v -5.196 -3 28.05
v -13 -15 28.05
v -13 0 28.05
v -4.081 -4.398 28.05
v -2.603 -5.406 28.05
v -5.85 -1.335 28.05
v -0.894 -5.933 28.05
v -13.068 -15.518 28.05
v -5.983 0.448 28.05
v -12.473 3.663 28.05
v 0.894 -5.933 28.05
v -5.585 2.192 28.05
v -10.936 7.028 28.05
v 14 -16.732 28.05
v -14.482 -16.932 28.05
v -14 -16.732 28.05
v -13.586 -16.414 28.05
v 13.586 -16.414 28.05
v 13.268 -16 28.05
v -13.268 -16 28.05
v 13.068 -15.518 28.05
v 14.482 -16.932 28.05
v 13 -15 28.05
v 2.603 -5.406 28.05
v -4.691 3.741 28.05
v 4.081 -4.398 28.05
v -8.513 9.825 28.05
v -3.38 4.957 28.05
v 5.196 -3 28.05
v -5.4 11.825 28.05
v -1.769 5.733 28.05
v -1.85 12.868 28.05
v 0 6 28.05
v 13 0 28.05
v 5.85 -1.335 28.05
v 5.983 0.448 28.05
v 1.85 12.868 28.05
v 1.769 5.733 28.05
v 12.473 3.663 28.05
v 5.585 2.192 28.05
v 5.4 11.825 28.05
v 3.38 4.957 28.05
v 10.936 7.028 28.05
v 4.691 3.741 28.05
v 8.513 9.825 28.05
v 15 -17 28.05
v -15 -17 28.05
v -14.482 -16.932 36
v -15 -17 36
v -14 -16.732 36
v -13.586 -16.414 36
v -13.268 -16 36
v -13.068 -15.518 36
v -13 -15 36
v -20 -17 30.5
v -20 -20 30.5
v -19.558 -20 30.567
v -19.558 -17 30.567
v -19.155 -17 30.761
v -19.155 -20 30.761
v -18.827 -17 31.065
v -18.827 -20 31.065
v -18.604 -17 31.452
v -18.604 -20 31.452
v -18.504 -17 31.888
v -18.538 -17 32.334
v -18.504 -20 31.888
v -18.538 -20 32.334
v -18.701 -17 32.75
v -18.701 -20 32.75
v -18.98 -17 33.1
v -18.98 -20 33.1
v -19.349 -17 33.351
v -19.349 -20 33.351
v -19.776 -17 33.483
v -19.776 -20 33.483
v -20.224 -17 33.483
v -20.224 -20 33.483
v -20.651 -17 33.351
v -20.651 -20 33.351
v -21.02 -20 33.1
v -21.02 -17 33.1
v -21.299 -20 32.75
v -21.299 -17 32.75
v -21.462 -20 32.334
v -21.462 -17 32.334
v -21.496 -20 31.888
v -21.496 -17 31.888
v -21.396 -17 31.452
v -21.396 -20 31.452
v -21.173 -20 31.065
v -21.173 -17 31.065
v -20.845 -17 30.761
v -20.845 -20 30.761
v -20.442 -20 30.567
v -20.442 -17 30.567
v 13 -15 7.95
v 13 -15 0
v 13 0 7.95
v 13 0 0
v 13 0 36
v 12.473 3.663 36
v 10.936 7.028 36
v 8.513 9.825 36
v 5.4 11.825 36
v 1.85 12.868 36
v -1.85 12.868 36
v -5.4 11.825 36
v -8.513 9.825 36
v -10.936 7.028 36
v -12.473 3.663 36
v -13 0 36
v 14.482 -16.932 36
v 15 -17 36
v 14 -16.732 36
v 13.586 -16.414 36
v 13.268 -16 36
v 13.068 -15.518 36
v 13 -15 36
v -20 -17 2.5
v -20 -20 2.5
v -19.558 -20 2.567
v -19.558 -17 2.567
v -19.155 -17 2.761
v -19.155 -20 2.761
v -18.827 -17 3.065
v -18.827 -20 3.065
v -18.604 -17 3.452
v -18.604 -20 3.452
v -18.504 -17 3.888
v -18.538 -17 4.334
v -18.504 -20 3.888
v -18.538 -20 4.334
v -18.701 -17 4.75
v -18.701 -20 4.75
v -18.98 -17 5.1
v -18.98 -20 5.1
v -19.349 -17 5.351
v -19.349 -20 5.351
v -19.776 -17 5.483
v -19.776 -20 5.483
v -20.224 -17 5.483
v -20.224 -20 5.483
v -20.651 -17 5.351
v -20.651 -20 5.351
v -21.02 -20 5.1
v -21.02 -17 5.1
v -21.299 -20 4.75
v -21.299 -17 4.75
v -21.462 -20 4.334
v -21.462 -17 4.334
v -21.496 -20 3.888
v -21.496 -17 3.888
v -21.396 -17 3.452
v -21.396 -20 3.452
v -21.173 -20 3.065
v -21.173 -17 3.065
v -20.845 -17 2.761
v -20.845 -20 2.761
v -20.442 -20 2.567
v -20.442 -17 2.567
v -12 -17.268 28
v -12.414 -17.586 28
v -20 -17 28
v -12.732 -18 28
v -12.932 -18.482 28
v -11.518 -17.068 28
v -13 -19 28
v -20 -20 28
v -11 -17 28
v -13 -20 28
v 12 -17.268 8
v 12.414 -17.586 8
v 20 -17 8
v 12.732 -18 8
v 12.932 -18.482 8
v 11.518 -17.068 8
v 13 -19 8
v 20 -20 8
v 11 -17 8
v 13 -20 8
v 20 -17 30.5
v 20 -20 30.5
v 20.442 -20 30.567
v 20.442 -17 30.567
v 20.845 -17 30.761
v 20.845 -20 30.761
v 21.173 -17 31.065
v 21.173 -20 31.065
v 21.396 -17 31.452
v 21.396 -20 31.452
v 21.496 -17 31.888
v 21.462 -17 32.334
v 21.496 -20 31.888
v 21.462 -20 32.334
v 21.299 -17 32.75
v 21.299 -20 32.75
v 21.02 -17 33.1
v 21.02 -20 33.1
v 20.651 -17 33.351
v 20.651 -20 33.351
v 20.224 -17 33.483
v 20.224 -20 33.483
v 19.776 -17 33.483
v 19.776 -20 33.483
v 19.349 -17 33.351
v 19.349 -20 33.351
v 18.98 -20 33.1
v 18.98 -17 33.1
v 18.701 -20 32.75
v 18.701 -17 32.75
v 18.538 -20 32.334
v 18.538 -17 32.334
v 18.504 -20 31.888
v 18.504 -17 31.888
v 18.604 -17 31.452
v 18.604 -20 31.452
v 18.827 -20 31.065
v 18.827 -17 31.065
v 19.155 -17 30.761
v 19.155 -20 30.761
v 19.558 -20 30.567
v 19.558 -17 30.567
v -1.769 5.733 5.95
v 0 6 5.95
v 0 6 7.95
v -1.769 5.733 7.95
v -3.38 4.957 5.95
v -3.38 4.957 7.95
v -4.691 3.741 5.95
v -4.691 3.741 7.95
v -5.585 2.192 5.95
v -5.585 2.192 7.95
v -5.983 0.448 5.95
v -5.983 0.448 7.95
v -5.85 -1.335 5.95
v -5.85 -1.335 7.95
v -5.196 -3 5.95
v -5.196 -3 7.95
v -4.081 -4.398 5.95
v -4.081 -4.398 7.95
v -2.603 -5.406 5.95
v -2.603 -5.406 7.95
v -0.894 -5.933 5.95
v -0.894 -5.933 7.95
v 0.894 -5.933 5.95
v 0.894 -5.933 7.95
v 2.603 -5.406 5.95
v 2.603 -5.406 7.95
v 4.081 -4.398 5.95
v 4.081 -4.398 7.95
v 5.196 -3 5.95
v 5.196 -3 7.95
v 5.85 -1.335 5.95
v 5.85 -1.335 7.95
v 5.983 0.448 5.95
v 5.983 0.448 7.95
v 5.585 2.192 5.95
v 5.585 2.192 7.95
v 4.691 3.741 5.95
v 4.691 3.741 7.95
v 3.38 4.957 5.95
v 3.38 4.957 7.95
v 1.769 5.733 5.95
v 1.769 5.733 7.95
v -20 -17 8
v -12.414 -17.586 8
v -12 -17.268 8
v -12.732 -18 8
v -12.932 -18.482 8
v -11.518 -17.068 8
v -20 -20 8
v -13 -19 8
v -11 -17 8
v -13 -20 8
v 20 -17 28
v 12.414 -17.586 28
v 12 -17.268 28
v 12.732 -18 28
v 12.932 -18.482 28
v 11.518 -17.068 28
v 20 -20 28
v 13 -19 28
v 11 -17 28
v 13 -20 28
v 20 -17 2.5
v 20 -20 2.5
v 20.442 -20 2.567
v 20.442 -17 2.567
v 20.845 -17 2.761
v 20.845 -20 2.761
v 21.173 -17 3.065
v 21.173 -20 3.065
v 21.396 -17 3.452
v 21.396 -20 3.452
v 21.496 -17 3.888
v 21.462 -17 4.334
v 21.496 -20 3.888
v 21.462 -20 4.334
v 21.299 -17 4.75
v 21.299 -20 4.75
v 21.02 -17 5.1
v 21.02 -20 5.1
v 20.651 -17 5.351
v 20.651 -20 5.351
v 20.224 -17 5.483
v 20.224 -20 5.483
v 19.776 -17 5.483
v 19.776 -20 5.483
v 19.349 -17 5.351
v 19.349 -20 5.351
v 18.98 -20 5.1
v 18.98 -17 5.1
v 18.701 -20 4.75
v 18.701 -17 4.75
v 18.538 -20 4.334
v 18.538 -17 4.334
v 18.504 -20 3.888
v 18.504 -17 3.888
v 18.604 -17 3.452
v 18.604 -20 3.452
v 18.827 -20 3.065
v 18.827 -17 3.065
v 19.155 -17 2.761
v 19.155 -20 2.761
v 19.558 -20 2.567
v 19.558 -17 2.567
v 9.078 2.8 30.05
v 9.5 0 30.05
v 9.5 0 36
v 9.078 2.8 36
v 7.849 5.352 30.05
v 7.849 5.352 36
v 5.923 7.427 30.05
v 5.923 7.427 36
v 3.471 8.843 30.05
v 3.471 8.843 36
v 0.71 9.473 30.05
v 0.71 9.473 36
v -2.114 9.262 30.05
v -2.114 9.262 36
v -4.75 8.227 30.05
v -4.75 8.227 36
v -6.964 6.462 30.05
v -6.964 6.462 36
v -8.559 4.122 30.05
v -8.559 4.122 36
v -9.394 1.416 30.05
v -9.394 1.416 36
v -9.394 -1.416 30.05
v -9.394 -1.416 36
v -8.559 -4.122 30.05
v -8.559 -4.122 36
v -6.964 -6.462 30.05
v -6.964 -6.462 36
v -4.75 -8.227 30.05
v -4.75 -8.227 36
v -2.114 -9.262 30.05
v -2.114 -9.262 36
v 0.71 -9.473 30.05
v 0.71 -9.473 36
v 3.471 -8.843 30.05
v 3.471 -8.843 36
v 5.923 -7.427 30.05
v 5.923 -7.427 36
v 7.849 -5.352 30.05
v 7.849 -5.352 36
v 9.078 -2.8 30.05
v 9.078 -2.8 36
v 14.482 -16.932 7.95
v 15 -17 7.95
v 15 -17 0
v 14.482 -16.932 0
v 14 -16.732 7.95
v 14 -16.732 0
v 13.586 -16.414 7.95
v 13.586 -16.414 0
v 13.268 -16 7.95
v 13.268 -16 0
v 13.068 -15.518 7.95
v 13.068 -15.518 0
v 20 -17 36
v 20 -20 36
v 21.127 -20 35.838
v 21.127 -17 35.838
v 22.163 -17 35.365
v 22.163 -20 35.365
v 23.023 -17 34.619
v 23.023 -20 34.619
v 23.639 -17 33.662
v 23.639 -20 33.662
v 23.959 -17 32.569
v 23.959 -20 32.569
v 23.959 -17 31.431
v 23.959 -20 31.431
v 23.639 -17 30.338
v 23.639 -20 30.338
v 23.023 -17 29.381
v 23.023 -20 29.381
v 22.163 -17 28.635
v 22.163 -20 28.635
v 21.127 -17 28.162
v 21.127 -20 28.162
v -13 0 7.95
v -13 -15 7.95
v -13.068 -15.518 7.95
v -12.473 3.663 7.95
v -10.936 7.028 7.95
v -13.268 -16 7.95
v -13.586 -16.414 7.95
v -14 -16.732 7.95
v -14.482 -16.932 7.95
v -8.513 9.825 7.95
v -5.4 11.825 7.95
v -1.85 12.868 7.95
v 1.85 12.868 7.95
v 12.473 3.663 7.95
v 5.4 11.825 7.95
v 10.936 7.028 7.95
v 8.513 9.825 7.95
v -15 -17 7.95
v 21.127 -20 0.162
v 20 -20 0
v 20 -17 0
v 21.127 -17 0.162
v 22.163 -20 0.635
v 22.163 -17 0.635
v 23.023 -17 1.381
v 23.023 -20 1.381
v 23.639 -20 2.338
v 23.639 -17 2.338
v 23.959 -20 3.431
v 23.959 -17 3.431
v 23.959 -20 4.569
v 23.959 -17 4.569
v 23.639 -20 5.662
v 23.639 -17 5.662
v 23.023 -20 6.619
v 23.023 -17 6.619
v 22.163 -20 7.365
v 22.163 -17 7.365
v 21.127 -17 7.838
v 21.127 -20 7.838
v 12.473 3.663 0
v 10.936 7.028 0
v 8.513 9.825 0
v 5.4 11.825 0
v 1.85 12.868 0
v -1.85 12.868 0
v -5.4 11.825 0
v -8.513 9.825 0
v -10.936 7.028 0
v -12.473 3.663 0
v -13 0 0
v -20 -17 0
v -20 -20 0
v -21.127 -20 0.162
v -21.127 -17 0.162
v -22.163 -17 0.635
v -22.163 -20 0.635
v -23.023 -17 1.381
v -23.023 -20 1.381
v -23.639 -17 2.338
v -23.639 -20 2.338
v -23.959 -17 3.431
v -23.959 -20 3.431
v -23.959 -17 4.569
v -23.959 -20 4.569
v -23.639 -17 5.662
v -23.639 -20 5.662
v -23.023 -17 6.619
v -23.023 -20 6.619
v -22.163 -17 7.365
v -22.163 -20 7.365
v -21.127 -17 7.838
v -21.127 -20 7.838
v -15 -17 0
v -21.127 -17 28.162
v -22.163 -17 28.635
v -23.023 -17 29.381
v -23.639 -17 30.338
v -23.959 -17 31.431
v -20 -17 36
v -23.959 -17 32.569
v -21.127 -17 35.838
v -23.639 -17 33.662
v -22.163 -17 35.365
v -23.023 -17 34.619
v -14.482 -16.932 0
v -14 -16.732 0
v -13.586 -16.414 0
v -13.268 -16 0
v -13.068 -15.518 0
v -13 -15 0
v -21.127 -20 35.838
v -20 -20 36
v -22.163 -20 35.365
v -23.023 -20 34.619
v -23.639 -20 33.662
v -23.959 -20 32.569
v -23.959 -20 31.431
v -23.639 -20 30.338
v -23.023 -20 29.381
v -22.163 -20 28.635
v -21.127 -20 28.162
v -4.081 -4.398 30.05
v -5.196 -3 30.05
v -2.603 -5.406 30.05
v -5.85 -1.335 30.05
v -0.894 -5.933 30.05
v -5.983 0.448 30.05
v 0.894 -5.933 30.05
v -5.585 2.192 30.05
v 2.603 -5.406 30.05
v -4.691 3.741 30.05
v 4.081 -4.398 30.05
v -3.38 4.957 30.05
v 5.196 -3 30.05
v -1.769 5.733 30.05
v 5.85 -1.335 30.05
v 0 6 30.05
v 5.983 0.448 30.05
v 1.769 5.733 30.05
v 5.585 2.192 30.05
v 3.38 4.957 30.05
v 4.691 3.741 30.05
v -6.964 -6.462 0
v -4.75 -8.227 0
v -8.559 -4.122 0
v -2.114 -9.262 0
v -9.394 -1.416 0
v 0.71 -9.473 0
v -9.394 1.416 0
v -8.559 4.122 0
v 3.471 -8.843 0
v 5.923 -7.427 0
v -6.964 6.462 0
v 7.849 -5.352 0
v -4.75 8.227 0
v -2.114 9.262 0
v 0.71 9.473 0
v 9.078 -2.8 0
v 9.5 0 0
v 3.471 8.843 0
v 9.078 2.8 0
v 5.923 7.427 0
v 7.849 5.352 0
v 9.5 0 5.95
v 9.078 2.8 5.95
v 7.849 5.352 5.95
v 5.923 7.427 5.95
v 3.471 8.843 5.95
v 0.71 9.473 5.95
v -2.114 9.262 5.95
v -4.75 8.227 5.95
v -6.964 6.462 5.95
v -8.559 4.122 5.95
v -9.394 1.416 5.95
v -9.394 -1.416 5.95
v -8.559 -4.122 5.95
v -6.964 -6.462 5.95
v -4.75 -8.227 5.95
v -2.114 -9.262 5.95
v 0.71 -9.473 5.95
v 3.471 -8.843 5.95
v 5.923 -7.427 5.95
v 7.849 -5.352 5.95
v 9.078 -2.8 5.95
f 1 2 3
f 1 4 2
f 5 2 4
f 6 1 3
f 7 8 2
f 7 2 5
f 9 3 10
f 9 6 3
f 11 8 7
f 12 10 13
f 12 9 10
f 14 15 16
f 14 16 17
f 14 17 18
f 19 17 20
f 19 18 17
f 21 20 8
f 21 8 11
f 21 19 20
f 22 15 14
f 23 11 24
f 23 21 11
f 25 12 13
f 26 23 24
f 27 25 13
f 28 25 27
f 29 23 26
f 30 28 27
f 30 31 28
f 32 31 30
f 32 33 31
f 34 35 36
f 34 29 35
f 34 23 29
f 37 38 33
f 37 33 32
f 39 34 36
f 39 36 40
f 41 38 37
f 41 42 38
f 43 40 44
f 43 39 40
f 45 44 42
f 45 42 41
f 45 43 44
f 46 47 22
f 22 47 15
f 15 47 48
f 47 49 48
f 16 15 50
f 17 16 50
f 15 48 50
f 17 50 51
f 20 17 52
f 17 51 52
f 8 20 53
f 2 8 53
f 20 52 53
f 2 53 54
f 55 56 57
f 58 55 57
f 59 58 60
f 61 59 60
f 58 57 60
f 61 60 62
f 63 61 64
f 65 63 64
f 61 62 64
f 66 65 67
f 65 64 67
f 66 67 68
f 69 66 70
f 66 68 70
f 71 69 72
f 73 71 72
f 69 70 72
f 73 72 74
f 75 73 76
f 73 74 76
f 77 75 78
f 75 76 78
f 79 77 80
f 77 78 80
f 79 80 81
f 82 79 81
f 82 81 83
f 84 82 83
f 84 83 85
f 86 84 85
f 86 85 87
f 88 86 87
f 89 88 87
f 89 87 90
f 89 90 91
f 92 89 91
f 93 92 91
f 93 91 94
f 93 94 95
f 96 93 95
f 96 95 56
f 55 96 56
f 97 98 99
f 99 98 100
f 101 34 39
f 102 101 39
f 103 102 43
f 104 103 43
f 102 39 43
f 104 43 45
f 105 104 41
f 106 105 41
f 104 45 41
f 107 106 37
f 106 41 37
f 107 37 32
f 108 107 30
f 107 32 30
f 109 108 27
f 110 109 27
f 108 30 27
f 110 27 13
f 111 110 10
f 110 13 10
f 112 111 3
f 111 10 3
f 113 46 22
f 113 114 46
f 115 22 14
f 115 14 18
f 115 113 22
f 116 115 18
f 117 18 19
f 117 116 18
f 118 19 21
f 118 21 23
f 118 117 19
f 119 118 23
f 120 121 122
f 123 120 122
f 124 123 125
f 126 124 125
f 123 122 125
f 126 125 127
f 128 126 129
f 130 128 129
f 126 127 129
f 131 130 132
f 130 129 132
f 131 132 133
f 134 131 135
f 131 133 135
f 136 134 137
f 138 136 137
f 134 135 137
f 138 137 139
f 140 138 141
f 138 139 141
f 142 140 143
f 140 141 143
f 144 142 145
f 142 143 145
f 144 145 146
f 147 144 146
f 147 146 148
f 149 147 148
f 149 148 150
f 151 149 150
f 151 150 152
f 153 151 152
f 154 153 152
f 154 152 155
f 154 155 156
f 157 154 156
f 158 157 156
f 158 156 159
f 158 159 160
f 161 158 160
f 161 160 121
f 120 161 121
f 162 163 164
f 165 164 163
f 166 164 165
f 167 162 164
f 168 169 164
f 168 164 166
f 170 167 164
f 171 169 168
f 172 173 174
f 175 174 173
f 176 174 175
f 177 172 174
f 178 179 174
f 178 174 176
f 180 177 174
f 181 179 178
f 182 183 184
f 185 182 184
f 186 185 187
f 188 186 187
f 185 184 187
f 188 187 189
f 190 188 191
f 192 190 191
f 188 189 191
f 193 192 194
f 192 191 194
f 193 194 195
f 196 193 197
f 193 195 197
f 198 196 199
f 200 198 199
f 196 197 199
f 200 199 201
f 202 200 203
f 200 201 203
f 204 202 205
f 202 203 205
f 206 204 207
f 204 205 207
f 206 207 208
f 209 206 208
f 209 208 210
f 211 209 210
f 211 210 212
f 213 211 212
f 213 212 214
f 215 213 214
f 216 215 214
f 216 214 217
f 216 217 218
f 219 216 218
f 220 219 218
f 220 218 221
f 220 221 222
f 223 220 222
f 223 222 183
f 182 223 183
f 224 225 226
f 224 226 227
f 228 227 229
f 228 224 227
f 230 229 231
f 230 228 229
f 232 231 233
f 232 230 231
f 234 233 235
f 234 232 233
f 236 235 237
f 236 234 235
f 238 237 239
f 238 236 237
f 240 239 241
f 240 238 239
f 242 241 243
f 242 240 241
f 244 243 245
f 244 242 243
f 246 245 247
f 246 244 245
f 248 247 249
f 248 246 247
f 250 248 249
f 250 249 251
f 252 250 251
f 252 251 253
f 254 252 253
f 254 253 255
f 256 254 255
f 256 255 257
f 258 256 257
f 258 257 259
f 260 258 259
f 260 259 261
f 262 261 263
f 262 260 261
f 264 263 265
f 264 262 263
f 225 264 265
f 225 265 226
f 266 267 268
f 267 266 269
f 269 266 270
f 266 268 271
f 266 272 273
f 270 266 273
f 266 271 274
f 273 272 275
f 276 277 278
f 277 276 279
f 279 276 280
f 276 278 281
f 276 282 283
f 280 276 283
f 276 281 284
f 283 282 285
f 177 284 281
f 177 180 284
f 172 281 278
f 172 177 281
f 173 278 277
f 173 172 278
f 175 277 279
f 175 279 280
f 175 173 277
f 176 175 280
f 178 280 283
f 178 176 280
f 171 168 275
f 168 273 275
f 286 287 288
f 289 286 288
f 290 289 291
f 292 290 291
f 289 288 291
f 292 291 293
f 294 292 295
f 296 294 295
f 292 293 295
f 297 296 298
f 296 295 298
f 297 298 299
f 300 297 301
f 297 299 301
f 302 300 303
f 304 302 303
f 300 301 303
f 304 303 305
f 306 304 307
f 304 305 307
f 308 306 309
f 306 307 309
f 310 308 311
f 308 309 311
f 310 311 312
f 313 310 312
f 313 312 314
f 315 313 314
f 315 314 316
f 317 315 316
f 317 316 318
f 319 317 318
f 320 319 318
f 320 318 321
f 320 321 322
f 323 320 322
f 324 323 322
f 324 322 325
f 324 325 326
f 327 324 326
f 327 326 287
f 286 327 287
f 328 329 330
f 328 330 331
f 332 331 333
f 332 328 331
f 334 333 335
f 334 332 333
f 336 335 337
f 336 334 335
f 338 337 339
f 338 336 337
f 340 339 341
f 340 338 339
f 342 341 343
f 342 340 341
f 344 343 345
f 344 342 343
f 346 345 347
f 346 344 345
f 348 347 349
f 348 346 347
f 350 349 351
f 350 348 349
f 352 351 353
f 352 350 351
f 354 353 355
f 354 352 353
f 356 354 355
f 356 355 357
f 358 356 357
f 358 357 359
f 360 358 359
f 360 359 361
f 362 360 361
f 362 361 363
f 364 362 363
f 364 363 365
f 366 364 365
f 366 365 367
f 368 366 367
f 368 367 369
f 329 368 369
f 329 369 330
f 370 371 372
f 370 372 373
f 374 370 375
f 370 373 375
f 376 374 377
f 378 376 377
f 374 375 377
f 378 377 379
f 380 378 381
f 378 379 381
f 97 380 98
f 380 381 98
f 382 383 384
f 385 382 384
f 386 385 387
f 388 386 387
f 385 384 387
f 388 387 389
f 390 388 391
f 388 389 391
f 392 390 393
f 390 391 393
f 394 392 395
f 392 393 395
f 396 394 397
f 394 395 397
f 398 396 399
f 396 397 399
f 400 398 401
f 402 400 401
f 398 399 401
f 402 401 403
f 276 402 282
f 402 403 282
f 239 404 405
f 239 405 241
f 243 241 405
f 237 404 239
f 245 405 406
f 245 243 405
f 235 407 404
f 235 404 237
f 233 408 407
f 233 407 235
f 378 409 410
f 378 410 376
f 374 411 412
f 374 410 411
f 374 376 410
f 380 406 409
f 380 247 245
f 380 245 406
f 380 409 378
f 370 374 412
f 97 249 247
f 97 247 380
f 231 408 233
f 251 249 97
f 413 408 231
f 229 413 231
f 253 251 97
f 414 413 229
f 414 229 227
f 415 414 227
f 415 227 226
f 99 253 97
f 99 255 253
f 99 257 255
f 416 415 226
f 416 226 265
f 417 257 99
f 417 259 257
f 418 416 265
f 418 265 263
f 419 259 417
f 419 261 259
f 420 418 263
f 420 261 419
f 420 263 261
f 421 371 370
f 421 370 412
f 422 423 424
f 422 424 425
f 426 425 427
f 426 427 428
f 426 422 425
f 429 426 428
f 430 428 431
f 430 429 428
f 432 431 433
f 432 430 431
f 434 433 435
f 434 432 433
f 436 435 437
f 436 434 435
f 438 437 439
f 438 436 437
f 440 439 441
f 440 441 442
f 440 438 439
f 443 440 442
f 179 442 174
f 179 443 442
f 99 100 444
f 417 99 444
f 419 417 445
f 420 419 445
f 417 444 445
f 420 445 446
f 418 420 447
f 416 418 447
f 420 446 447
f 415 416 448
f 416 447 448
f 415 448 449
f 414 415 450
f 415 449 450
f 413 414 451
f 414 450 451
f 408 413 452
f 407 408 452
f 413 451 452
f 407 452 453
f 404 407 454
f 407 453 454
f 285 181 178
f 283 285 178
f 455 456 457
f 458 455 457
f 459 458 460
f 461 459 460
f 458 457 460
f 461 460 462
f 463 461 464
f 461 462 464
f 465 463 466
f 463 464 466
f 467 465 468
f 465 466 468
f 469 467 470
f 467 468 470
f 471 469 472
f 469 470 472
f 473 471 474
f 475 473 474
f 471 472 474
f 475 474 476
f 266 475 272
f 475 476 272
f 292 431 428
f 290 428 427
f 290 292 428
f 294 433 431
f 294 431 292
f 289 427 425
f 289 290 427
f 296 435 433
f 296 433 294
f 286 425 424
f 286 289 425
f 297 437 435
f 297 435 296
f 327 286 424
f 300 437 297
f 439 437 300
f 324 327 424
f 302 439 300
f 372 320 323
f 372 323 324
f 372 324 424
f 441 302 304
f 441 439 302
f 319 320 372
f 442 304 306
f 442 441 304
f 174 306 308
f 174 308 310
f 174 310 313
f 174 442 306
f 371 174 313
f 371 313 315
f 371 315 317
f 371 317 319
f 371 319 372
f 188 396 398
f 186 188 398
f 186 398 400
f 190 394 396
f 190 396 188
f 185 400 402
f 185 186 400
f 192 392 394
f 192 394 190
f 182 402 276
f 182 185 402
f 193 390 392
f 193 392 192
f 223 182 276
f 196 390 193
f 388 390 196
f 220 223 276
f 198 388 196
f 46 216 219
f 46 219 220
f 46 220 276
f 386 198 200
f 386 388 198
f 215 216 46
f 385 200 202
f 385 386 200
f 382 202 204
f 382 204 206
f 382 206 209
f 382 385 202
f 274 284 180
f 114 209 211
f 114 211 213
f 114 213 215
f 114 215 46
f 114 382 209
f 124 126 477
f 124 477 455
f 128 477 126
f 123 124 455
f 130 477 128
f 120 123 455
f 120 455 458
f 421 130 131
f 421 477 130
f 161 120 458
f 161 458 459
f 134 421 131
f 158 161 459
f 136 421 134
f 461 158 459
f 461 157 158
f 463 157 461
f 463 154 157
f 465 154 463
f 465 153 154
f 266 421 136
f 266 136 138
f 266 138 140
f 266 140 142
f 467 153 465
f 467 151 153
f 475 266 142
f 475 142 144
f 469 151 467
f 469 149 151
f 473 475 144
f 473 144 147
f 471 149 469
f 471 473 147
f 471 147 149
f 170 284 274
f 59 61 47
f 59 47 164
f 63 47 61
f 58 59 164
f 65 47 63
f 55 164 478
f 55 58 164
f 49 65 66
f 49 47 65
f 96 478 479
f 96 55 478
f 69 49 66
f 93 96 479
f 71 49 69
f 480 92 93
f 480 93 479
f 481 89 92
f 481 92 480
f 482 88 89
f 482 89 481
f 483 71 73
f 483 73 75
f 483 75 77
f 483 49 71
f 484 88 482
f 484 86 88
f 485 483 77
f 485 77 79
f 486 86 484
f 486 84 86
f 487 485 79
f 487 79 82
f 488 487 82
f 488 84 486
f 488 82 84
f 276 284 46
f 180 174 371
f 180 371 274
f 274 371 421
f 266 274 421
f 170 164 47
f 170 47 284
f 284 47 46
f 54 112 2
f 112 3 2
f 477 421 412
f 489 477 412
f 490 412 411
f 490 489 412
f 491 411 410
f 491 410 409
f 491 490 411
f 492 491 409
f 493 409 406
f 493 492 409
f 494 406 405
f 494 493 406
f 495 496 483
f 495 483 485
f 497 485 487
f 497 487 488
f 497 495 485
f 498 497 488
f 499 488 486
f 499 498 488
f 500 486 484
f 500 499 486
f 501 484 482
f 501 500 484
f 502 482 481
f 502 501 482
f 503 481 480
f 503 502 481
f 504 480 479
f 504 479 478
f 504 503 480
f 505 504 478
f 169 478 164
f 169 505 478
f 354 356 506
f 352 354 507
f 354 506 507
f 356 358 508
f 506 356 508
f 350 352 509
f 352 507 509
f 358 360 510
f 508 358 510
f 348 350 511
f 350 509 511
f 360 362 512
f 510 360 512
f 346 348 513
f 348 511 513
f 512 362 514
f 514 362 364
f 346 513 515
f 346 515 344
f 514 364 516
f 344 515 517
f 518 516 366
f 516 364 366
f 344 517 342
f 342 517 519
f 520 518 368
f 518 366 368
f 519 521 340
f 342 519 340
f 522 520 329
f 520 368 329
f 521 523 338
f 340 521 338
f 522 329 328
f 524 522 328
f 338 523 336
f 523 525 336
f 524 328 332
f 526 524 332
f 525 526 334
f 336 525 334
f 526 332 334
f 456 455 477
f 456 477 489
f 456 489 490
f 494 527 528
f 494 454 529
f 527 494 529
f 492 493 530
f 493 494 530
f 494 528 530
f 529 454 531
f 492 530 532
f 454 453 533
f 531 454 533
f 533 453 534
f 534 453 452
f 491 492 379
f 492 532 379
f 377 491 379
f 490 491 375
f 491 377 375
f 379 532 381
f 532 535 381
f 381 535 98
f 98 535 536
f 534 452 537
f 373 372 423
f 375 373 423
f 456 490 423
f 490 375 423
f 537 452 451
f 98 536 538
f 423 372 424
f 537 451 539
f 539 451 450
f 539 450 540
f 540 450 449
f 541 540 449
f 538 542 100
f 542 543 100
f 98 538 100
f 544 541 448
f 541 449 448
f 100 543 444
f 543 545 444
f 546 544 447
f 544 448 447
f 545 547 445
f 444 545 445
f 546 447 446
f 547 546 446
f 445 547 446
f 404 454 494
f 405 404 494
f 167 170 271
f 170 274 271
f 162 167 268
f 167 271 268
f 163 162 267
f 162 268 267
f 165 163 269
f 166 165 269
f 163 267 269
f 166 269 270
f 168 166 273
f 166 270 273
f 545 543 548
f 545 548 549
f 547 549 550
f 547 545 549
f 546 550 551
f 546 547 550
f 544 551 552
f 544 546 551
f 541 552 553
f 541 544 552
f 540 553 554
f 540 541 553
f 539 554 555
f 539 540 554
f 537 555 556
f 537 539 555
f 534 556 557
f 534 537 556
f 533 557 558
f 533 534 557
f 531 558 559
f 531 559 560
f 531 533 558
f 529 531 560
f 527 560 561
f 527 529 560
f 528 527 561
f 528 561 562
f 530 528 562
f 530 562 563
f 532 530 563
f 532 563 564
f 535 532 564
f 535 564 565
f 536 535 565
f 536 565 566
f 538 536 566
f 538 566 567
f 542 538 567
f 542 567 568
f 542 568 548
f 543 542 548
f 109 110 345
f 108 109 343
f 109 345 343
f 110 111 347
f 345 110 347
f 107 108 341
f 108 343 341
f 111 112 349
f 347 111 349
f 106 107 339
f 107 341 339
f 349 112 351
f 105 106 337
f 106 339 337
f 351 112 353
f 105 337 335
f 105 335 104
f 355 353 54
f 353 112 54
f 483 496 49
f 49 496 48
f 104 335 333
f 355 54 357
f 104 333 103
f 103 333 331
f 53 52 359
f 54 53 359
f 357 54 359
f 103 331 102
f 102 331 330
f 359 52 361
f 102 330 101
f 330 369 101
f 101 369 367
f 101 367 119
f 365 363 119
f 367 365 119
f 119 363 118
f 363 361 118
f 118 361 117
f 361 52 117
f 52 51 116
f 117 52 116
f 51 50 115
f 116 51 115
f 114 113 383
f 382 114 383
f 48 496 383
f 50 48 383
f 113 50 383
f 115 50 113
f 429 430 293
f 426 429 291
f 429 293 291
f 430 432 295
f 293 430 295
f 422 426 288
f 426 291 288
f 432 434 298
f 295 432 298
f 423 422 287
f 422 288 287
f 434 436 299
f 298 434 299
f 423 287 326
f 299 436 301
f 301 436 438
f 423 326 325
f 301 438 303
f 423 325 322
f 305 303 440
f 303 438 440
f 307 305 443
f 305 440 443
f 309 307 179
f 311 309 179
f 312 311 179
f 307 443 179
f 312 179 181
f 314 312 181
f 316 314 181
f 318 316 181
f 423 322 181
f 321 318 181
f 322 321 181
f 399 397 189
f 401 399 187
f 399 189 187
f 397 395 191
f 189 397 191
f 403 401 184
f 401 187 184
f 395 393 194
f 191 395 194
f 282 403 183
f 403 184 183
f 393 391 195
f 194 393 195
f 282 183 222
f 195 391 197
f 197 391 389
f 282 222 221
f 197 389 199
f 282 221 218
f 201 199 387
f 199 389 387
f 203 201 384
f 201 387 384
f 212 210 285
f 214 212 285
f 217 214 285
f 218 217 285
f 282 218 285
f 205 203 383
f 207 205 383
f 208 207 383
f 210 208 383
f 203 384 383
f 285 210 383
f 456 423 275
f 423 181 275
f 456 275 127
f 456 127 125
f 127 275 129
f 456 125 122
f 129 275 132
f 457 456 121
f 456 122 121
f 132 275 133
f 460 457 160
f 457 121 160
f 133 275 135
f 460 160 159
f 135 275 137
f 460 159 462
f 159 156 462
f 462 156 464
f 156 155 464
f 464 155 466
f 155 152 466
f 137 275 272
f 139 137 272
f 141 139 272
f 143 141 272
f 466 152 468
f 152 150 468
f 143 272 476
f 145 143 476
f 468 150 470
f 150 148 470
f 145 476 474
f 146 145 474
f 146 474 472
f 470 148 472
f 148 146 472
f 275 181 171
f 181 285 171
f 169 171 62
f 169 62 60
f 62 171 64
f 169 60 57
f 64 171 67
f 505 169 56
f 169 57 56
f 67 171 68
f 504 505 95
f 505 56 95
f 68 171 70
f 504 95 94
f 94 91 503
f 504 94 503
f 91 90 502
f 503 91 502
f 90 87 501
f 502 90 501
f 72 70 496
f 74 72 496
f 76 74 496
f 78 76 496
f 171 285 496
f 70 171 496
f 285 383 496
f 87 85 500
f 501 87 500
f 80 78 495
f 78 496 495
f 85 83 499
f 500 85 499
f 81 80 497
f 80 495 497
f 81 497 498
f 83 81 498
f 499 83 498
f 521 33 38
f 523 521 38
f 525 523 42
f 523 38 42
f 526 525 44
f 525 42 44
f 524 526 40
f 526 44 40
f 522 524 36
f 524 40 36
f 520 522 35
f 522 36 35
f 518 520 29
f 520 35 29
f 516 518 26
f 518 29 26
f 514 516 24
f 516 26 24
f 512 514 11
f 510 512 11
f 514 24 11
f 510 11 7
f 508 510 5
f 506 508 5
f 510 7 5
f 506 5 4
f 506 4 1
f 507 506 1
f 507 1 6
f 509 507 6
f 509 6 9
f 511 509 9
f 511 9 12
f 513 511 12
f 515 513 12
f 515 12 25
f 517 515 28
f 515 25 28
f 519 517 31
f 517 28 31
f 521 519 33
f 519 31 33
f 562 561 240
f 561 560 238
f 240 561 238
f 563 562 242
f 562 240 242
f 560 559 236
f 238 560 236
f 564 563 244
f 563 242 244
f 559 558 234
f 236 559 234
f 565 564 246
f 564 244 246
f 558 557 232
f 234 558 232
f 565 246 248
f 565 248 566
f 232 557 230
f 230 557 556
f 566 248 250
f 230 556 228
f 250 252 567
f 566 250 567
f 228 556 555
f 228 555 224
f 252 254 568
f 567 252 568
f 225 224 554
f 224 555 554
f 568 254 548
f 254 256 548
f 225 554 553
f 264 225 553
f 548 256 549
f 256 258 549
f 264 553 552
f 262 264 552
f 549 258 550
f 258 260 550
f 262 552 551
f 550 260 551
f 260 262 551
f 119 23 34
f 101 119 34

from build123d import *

# Parameters (mm, degrees)
CROQUIS1_R              = 9.5
SALIENTE_EXTRUIR1_DEPTH = 36
CROQUIS2_W              = 20.1
CROQUIS2_H              = 30
CORTAR_EXTRUIR2_DEPTH   = 49.703182648
CROQUIS3_R              = 9.5
CROQUIS3_R_2            = 6
SALIENTE_EXTRUIR2_DEPTH = 2
SALIENTE_EXTRUIR3_START = -2
CROQUIS4_R              = 9.5
CROQUIS4_R_2            = 6
SALIENTE_EXTRUIR3_DEPTH = 2
SALIENTE_EXTRUIR4_DEPTH = 3
CROQUIS6_R              = 1.5
CORTAR_EXTRUIR3_DEPTH   = 55.415071442
REDONDEO3_R             = 2


with BuildPart() as part:
    # Croquis1 → Saliente-Extruir1 (new body)
    with BuildSketch(Plane.XY):
        with BuildLine():
            Line((-13, 0), (-13, -20))
            Line((-13, -20), (13, -20))
            Line((13, -20), (13, 0))
            ThreePointArc((13, 0), (0, 13), (-13, 0))
        make_face()
        Circle(CROQUIS1_R, mode=Mode.SUBTRACT)
    extrude(amount=SALIENTE_EXTRUIR1_DEPTH)

    # Croquis2 → Cortar-Extruir2 (cut, through all)
    with BuildSketch(Plane(origin=(13, 0, 0), x_dir=(0, 0, -1), z_dir=(1, 0, 0))):
        with Locations((-18, -2)):
            Rectangle(CROQUIS2_W, CROQUIS2_H)
    extrude(amount=-CORTAR_EXTRUIR2_DEPTH, mode=Mode.SUBTRACT)

    # Croquis3 → Saliente-Extruir2 (add)
    with BuildSketch(Plane(origin=(0, 0, 28.05), x_dir=(-1, 0, 0), z_dir=(0, 0, -1))):
        with Locations(Location((0, 0, 0), (0, 0, 90))):
            Circle(CROQUIS3_R)
        with Locations(Location((0, 0, 0), (0, 0, 90))):
            Circle(CROQUIS3_R_2, mode=Mode.SUBTRACT)
    extrude(amount=-SALIENTE_EXTRUIR2_DEPTH)

    # Croquis4 → Saliente-Extruir3 (add)
    with BuildSketch(Plane.XY.offset(7.95).offset(SALIENTE_EXTRUIR3_START)):
        Circle(CROQUIS4_R)
        with Locations(Location((0, 0, 0), (0, 0, 90))):
            Circle(CROQUIS4_R_2, mode=Mode.SUBTRACT)
    extrude(amount=SALIENTE_EXTRUIR3_DEPTH)

    # Croquis5 → Saliente-Extruir4 (add)
    with BuildSketch(Plane.XZ.offset(20)):
        with BuildLine():
            Line((13, 36), (20, 36))
            ThreePointArc((20, 36), (24, 32), (20, 28))
            Line((20, 28), (13, 28))
            Line((13, 28), (13, 36))
        make_face()
        with BuildLine():
            Line((13, 0), (20, 0))
            ThreePointArc((20, 0), (24, 4), (20, 8))
            Line((20, 8), (13, 8))
            Line((13, 8), (13, 0))
        make_face()
        with BuildLine():
            Line((-13, 0), (-20, 0))
            ThreePointArc((-20, 0), (-24, 4), (-20, 8))
            Line((-20, 8), (-13, 8))
            Line((-13, 8), (-13, 0))
        make_face()
        with BuildLine():
            Line((-13, 28), (-13, 36))
            Line((-13, 36), (-20, 36))
            ThreePointArc((-20, 36), (-24, 32), (-20, 28))
            Line((-20, 28), (-13, 28))
        make_face()
    extrude(amount=-SALIENTE_EXTRUIR4_DEPTH)

    # Croquis6 → Cortar-Extruir3 (cut, through all)
    with BuildSketch(Plane.XZ.offset(20)):
        with Locations(Location((-20, 32, 0), (0, 0, 270))):
            Circle(CROQUIS6_R)
        with Locations(Location((20, 32, 0), (0, 0, 270))):
            Circle(CROQUIS6_R)
        with Locations(Location((-20, 4, 0), (0, 0, 270))):
            Circle(CROQUIS6_R)
        with Locations(Location((20, 4, 0), (0, 0, 270))):
            Circle(CROQUIS6_R)
    extrude(amount=-CORTAR_EXTRUIR3_DEPTH, mode=Mode.SUBTRACT)

    # Redondeo3
    redondeo3_edges = [part.edges().sort_by_distance(p)[0] for p in [
        (13, -17, 18),
        (-13, -17, 18),
        (-13, -17, 32.025),
        (-13, -17, 3.975),
        (13, -17, 3.975),
        (13, -17, 32.025),
    ]]
    fillet(redondeo3_edges, radius=REDONDEO3_R)


solid = part.part
